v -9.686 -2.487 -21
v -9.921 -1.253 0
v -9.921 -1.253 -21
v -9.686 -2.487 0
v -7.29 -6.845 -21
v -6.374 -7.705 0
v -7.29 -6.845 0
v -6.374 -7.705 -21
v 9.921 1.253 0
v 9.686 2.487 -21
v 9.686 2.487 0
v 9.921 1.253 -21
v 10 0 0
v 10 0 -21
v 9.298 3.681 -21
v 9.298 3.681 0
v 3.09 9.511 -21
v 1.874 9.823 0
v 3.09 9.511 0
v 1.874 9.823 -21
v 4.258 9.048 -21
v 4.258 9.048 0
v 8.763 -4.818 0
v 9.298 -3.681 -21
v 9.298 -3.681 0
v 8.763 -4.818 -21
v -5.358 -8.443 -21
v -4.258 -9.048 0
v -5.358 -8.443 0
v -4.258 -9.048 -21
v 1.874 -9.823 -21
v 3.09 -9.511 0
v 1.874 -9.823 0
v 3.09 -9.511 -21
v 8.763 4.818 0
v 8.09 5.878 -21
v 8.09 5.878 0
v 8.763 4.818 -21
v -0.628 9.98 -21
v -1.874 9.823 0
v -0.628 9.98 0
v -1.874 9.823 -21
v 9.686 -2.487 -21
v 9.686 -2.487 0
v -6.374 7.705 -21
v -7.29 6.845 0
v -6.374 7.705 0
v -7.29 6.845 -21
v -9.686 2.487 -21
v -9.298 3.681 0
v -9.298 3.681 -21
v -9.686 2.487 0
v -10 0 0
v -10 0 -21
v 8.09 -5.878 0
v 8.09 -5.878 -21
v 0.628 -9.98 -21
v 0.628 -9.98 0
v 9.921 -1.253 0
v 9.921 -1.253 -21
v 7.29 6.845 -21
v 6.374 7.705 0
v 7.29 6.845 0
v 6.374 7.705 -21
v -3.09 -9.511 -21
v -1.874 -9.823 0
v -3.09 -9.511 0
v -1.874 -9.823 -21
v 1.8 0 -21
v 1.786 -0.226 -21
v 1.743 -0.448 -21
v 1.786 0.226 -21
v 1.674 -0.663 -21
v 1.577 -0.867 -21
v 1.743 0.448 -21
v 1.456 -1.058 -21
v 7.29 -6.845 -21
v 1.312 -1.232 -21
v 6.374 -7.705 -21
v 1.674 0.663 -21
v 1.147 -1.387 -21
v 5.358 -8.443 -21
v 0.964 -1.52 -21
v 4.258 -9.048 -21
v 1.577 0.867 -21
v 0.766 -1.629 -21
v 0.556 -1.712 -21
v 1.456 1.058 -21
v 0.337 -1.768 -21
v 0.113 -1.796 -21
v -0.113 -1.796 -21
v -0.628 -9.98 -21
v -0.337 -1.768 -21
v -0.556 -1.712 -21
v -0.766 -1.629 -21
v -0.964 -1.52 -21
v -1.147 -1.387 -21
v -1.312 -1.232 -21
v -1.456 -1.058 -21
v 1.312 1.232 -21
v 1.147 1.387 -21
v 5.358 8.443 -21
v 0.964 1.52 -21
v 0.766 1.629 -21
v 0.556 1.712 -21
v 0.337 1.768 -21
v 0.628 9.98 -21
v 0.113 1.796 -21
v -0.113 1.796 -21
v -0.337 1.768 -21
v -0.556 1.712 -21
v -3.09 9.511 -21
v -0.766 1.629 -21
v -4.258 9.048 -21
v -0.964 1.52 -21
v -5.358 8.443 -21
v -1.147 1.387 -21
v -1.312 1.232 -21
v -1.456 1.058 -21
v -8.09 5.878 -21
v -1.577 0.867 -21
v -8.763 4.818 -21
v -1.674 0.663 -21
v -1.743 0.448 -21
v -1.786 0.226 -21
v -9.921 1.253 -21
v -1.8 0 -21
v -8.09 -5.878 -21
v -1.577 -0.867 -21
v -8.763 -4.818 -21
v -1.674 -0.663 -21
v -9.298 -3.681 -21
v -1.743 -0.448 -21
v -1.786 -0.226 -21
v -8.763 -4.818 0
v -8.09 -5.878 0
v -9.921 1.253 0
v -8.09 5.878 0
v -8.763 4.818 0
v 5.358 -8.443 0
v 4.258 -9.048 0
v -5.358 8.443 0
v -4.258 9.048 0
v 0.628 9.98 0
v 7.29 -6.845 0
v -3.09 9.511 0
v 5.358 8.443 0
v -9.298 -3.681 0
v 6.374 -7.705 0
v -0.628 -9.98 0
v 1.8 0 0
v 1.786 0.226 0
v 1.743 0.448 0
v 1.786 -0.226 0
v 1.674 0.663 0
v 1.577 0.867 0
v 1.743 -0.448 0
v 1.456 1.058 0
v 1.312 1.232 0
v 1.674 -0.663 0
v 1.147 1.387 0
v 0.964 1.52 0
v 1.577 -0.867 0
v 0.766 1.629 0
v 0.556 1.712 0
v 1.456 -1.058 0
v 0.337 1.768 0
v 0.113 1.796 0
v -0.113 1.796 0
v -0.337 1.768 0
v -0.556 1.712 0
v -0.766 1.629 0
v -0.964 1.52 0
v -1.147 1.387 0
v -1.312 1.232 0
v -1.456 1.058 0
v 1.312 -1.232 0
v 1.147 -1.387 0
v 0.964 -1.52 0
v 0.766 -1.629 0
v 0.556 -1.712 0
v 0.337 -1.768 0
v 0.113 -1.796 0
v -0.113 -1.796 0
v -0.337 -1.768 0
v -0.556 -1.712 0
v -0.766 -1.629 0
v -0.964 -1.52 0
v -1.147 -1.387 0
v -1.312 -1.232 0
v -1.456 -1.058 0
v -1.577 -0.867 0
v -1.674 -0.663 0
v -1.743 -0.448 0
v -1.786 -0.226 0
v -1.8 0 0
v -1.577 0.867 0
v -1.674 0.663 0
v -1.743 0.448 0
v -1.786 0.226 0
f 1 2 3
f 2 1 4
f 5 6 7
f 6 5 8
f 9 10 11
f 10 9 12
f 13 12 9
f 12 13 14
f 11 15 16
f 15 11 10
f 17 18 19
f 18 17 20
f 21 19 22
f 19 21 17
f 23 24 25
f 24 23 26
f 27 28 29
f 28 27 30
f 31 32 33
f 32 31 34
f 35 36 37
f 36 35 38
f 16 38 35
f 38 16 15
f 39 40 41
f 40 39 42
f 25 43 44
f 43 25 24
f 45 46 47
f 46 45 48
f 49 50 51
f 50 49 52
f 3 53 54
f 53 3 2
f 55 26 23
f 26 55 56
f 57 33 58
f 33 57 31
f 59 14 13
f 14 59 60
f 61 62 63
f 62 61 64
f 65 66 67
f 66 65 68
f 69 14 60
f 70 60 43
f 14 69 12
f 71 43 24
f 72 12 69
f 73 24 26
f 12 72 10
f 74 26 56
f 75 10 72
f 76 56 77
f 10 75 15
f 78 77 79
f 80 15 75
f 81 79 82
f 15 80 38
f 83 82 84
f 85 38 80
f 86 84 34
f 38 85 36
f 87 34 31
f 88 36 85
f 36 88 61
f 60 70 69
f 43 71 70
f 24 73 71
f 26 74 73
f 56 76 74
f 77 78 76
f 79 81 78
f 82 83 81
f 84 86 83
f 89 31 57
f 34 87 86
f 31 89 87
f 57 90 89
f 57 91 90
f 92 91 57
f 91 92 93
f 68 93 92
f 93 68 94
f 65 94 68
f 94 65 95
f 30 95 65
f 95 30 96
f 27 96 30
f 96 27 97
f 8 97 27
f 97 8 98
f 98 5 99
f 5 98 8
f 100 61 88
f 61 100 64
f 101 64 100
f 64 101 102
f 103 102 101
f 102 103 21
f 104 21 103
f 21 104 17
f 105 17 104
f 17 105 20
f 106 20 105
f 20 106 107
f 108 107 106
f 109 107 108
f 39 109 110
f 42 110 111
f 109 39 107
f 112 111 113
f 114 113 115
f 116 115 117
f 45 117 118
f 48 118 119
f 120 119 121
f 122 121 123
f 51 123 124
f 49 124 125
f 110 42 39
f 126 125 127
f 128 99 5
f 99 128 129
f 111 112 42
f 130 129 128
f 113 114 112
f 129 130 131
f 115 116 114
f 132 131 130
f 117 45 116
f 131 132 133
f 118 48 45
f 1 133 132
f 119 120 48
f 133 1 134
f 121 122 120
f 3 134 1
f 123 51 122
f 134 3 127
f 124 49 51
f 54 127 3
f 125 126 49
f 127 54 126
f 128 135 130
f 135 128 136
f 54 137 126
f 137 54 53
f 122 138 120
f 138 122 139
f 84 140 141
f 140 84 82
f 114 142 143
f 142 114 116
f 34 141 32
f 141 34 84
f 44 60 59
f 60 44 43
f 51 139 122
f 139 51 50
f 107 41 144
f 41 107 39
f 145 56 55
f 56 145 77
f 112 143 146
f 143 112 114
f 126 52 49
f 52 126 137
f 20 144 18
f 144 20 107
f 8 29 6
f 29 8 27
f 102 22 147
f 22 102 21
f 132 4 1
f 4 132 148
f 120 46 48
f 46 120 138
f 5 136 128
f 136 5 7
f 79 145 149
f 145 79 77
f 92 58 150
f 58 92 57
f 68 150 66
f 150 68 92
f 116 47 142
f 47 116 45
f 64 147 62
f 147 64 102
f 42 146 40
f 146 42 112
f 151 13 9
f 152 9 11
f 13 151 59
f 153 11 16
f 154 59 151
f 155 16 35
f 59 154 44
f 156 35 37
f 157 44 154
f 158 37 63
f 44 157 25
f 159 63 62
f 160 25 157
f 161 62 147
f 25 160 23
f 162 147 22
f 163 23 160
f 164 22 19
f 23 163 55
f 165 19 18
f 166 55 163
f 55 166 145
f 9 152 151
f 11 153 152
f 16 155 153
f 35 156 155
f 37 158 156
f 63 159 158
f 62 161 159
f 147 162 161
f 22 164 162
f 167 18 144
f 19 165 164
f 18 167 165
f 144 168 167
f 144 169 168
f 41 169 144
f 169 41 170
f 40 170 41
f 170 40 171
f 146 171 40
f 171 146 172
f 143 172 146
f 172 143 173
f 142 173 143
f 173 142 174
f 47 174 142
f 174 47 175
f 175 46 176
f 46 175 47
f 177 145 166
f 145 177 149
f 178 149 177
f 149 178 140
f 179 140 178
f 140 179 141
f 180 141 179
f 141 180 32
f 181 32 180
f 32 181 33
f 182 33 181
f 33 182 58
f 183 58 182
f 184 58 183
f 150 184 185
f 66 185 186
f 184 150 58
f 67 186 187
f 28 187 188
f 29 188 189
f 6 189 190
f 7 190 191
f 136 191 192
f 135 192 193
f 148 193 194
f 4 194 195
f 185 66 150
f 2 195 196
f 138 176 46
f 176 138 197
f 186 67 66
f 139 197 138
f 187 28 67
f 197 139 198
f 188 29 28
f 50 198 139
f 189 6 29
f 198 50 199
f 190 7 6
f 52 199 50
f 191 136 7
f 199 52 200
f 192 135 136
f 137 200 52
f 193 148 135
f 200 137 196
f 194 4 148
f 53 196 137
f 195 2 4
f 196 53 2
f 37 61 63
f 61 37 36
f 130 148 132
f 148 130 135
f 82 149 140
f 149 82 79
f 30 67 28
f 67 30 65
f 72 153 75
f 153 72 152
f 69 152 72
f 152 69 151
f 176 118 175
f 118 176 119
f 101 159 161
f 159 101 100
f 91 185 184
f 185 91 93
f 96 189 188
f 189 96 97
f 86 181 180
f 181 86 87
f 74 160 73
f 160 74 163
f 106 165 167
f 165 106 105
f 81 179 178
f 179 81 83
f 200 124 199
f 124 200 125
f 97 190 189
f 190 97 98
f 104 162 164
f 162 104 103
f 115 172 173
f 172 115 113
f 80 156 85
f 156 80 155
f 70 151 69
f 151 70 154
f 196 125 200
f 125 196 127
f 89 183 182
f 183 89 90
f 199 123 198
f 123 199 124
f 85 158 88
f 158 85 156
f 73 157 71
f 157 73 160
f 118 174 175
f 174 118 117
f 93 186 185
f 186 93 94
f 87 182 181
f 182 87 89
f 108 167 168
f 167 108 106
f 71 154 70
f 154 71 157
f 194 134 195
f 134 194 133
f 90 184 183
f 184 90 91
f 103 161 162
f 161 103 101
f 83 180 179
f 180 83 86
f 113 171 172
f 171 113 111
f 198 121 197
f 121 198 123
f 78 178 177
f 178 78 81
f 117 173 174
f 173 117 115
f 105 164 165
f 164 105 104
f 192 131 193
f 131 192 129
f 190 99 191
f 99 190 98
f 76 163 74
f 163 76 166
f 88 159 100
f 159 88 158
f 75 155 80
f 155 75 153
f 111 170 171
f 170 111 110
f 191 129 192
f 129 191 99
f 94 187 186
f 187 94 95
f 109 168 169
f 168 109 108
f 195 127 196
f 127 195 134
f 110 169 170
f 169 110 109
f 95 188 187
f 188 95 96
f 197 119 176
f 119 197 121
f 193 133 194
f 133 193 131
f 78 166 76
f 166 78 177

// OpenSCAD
$fn = 50;


difference() {
	union() {
		translate(v = [0, 0, -21.0000000000]) {
			cylinder(h = 21, r = 10.0000000000);
		}
		cylinder(h = 0, r = 20.0000000000);
	}
	union() {
		#translate(v = [0, 0, -21]) {
			cylinder(h = 21, r = 1.8000000000);
		}
	}
}
